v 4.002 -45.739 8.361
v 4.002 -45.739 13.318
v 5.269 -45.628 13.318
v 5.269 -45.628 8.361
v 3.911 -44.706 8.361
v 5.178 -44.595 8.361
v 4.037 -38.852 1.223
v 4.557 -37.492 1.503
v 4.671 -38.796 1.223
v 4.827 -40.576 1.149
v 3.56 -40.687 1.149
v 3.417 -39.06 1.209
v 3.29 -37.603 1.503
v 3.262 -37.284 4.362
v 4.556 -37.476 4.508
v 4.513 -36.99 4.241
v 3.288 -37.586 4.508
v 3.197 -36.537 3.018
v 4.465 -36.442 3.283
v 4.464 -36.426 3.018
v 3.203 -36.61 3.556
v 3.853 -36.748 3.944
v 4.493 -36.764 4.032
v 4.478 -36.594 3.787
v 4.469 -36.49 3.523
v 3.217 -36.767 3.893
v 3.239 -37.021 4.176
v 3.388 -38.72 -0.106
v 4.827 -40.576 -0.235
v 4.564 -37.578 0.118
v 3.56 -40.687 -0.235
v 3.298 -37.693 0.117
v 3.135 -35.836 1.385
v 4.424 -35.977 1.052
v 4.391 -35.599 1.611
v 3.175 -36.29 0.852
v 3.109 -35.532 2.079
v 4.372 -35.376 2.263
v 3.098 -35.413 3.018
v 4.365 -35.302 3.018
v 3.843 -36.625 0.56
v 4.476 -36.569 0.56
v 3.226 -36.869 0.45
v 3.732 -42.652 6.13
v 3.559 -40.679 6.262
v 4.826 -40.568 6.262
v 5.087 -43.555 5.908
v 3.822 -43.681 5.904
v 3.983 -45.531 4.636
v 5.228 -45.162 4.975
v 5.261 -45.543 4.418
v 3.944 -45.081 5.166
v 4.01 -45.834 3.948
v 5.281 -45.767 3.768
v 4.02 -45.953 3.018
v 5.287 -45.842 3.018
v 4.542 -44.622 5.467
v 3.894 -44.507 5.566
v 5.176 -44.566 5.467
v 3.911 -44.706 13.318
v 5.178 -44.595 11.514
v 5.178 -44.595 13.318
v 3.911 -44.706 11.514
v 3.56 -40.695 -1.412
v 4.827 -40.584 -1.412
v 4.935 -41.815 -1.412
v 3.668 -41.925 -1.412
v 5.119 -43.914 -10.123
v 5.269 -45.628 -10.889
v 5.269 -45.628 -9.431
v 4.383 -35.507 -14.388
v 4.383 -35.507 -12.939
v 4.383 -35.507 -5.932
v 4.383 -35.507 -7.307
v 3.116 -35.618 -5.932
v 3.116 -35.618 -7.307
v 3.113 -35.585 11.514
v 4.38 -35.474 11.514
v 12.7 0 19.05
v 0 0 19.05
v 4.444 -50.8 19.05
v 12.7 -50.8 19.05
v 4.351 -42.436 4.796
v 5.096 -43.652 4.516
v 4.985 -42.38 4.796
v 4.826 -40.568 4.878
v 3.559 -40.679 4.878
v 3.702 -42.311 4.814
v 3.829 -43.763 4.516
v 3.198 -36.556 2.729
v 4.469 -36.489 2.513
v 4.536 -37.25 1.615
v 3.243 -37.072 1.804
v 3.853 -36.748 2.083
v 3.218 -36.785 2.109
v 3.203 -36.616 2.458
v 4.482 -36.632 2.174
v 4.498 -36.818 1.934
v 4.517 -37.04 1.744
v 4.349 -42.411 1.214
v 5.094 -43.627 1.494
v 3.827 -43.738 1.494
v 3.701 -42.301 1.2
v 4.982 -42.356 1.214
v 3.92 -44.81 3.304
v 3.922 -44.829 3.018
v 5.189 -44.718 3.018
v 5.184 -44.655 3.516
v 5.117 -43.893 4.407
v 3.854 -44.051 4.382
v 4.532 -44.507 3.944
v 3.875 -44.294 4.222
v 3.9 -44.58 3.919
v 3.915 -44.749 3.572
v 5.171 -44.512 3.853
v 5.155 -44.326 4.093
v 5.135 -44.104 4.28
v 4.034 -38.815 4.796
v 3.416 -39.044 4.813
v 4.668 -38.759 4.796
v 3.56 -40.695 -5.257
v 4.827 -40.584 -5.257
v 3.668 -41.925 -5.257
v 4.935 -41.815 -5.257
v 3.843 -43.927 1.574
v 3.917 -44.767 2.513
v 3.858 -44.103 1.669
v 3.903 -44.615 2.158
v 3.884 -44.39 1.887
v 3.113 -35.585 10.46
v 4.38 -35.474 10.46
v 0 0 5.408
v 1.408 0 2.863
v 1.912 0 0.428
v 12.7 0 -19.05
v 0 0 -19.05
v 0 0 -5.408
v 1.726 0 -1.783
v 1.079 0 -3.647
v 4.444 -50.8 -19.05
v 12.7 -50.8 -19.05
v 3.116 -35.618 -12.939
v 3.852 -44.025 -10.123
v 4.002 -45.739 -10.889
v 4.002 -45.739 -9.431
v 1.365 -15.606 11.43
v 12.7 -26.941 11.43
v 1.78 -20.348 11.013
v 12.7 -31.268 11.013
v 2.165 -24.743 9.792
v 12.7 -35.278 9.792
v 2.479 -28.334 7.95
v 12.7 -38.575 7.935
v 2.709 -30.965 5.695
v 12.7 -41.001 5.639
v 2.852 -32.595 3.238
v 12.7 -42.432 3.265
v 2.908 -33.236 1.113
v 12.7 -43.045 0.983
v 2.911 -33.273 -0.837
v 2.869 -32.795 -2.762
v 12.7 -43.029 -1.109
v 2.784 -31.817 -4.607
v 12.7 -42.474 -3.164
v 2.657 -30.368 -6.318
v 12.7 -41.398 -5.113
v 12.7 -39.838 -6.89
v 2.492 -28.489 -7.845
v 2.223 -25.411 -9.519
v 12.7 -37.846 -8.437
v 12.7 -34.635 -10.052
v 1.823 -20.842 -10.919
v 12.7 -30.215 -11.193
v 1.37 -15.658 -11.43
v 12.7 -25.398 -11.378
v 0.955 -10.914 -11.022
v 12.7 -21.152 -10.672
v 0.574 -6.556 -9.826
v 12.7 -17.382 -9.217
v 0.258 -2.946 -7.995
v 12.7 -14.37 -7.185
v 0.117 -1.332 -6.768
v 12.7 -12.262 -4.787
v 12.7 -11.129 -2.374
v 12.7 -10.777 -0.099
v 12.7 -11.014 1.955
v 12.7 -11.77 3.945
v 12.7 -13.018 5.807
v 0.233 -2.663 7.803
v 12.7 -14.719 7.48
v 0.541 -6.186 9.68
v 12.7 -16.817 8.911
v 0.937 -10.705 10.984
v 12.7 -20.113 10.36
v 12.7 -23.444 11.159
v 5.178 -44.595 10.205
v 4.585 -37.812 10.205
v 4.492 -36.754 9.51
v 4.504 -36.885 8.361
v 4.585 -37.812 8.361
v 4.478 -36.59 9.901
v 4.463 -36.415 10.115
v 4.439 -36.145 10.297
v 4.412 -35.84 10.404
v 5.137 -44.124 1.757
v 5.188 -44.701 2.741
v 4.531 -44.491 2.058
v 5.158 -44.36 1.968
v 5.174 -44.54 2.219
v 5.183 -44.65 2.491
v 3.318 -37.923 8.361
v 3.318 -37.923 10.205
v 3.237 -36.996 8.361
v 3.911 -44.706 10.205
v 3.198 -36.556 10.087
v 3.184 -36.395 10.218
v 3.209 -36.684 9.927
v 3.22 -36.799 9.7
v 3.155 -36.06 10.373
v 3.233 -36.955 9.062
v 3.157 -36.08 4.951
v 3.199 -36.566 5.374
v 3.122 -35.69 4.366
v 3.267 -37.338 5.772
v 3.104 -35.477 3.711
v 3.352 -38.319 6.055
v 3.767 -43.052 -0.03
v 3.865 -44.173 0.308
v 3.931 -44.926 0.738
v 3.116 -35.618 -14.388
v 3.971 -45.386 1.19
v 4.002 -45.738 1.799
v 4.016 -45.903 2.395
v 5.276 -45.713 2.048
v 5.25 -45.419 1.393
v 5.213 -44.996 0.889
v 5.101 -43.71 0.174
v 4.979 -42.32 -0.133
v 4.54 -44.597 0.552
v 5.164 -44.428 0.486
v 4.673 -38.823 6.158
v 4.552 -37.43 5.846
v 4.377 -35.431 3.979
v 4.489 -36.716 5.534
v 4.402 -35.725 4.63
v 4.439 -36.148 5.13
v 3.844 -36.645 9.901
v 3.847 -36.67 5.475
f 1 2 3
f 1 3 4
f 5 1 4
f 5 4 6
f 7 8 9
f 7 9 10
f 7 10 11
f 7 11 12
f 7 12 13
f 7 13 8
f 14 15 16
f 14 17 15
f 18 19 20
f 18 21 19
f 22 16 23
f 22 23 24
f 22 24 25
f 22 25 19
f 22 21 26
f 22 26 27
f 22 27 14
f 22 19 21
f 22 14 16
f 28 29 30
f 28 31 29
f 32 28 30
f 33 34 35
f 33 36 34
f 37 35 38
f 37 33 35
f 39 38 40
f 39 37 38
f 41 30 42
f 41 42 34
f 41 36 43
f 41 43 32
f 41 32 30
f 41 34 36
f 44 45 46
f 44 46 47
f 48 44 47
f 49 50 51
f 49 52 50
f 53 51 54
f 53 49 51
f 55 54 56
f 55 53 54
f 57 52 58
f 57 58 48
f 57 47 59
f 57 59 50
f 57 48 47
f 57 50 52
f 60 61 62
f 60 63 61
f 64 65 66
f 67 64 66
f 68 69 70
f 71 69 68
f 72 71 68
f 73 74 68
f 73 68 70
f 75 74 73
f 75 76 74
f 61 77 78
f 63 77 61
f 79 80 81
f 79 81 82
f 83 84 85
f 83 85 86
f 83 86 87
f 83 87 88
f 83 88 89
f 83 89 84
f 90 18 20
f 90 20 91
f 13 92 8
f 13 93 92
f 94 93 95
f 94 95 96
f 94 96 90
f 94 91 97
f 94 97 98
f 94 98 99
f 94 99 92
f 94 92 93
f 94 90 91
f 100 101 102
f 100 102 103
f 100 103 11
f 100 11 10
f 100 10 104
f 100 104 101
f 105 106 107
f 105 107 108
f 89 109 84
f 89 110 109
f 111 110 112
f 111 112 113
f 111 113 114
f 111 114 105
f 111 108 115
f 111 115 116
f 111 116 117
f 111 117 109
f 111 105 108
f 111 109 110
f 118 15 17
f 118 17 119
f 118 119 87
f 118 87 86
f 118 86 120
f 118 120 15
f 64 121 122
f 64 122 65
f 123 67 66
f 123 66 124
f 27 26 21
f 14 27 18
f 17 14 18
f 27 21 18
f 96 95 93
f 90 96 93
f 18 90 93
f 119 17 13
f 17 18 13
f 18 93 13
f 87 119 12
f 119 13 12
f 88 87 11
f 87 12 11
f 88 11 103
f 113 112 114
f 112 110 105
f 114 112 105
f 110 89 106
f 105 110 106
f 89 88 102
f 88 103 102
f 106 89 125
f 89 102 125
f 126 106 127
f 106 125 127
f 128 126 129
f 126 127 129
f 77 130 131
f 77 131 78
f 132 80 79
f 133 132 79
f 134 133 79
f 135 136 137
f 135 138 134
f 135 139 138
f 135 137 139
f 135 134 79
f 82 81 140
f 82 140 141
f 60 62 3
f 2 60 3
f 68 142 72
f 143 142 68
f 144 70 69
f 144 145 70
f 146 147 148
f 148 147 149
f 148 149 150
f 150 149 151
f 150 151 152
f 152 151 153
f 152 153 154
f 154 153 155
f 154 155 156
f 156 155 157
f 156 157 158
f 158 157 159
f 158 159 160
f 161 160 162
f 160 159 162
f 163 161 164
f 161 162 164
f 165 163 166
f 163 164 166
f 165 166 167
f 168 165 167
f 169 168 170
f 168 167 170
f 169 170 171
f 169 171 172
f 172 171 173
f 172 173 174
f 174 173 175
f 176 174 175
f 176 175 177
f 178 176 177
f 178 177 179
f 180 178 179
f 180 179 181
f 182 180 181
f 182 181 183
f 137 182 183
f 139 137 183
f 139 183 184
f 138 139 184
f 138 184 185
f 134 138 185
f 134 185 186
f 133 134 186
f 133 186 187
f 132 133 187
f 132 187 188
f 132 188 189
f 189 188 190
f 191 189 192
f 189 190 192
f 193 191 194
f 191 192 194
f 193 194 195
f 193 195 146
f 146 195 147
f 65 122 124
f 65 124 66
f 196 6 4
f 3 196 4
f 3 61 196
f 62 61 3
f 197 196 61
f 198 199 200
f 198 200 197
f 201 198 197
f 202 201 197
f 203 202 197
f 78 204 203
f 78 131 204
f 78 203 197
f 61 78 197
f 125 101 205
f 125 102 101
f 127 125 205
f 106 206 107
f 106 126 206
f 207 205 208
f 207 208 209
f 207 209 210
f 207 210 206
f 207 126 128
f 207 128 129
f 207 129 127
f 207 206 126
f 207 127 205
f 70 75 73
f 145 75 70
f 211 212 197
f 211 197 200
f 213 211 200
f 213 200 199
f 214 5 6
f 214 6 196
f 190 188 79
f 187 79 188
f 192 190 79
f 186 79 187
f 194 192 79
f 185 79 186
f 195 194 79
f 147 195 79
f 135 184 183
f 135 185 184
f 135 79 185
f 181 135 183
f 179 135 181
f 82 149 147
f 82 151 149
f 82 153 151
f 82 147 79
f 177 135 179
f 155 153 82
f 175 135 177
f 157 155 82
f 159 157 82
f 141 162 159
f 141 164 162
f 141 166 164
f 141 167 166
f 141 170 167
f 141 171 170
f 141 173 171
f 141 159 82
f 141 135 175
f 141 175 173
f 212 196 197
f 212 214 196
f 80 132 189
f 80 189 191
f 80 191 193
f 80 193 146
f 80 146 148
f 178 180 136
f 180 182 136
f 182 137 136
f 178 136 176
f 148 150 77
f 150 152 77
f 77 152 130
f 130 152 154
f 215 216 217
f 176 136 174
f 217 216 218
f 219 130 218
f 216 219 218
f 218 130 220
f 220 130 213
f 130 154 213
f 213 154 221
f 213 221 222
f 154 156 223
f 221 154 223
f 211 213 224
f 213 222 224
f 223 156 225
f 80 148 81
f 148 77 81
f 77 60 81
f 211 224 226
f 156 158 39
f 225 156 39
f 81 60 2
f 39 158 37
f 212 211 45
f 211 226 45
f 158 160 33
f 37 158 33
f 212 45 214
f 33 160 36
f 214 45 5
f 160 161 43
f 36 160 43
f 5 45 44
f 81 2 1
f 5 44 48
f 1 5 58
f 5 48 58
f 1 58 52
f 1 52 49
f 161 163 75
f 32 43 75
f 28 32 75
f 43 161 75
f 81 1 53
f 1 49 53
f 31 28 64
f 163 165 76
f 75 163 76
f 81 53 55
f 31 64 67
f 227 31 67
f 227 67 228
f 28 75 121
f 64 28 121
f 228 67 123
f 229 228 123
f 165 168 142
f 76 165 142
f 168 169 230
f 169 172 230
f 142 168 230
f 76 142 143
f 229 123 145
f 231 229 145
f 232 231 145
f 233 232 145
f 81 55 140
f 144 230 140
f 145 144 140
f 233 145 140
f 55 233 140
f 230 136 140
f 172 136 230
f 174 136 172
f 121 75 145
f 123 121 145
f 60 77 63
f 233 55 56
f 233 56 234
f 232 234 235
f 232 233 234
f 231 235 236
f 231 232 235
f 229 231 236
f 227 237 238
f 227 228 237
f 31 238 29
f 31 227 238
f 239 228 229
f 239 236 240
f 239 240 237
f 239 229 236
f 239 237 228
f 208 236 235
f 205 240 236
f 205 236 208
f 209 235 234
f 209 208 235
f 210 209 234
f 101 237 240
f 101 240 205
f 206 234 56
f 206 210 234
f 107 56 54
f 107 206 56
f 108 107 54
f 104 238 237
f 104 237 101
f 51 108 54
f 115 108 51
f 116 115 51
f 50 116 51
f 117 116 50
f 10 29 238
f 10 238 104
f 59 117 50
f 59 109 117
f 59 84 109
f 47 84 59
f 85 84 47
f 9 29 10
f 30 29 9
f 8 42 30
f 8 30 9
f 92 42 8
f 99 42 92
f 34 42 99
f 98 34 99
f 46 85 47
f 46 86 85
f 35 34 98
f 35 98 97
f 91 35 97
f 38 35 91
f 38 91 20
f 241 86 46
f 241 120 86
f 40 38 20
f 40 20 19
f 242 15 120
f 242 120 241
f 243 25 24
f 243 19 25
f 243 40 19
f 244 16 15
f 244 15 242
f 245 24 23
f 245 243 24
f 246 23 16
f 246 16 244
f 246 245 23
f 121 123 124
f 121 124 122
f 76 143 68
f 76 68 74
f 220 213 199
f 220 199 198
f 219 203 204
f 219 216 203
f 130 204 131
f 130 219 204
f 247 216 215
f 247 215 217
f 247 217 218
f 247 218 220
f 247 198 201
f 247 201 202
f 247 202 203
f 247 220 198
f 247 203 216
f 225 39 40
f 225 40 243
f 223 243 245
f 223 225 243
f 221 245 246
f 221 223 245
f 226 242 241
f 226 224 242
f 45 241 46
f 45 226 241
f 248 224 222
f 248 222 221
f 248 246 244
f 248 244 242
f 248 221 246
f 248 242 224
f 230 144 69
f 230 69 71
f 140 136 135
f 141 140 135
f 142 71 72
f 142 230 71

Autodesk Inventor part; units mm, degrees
ref_plane "YZ Plane" through (0, 0, 0) normal (1, 0, 0) x (0, 1, 0)
ref_plane "XZ Plane" through (0, 0, 0) normal (0, 1, 0) x (-1, 0, 0)
sketch "Sketch1" plane through (0, 0, 0) normal (0, 0, 1) x (1, 0, 0)
  line L0 (0, 0) -> (4.4444, -50.8)
  line L1 (0, -76.2) -> (0, 12.7) projected
  line L2 (0, 0) -> (12.7, 0)
  line L3 (12.7, 0) -> (12.7, -50.8)
  line L4 (4.4444, -50.8) -> (12.7, -50.8)
  dimension "d0" = 5
  dimension "d1" = 12.7
  dimension "d3" = 50.8
extrude "Extrusion1" add sketch "Sketch1" along normal mid plane 38.1
ref_plane "Work Plane1" through (12.7, -50.8, 0) normal (0.7071, -0.7071, 0) x (0, 0, 1)
sketch "Sketch2" plane through (12.7, -50.8, 0) normal (0.7071, -0.7071, 0) x (0, 0, 1)
  line L0 (19.05, 0) -> (19.05, -35.921) projected
  line L1 (19.05, -35.921) -> (-19.05, -35.921) projected
  line L2 (-19.05, -35.921) -> (-19.05, 0) projected
  line L3 (-19.05, 0) -> (19.05, 0) projected
  circle A0 centre (0, -16.871) radius 11.43
  point P0 (0, -26.9408)
  dimension "d7" = 22.86
  dimension "d10" = 19.05
extrude "Extrusion2" cut sketch "Sketch2" against normal through all contours A0
sketch "Sketch3" plane through (4.4444, -50.8, -19.05) normal (-0.9962, -0.0872, 0) x (0, 0, 1)
  line L0 (0, 0) -> (0, 50.994) construction
  line L1 (0, 10.16) -> (38.1, 10.16) construction
  line L2 (38.1, 50.994) -> (38.1, 0) construction
  line L3 (0, 0) -> (38.1, 0) construction
  line L4 (13.1178, 15.24) -> (9.6187, 5.08)
  line L5 (9.6187, 5.08) -> (8.1613, 5.08)
  line L6 (8.1613, 5.08) -> (4.6622, 15.24)
  line L7 (4.6622, 15.24) -> (6.1112, 15.24)
  line L8 (6.1112, 15.24) -> (8.9271, 6.8008)
  line L9 (8.9271, 6.8008) -> (11.7429, 15.24)
  line L10 (11.7429, 15.24) -> (13.1178, 15.24)
  line L11 (17.638, 8.9085) -> (13.793, 8.9085)
  line L12 (13.793, 8.9085) -> (13.793, 10.1435)
  line L13 (13.793, 10.1435) -> (17.638, 10.1435)
  line L14 (17.638, 10.1435) -> (17.638, 8.9085)
  spline S0 degree 2 poles (25.3115, 10.16) (25.3115, 7.4265) (23.7224, 4.8659) (22.0675, 4.8659) knots 0 0 0 1 2 2 2
  spline S1 degree 2 poles (22.0675, 4.8659) (20.3879, 4.8659) (18.8153, 7.4759) (18.8153, 10.1518) knots 0 0 0 1 2 2 2
  spline S2 degree 2 poles (18.8153, 10.1518) (18.8153, 12.9017) (20.4044, 15.4458) (22.0675, 15.4458) knots 0 0 0 1 2 2 2
  spline S3 degree 2 poles (22.0675, 15.4458) (23.7389, 15.4458) (25.3115, 12.8112) (25.3115, 10.16) knots 0 0 0 1 2 2 2
  spline S4 degree 2 poles (23.566, 7.0642) (23.7636, 7.5665) (23.9283, 9.1144) (23.9283, 10.16) knots 0 0 0 1 2 2 2
  spline S5 degree 2 poles (23.9283, 10.16) (23.9283, 11.2056) (23.7636, 12.7453) (23.5578, 13.264) knots 0 0 0 1 2 2 2
  spline S6 degree 2 poles (23.5578, 13.264) (23.3519, 13.7827) (22.6356, 14.3179) (22.0675, 14.3179) knots 0 0 0 1 2 2 2
  spline S7 degree 2 poles (22.0675, 14.3179) (21.4994, 14.3179) (20.7667, 13.7827) (20.5526, 13.2475) knots 0 0 0 1 2 2 2
  spline S8 degree 2 poles (20.5526, 13.2475) (20.3468, 12.7288) (20.1986, 11.148) (20.1986, 10.1518) knots 0 0 0 1 2 2 2
  spline S9 degree 2 poles (20.1986, 10.1518) (20.1986, 9.0814) (20.3303, 7.6488) (20.5444, 7.0889) knots 0 0 0 1 2 2 2
  spline S10 degree 2 poles (20.5444, 7.0889) (20.742, 6.562) (21.4747, 5.9939) (22.0675, 5.9939) knots 0 0 0 1 2 2 2
  spline S11 degree 2 poles (22.0675, 5.9939) (22.6274, 5.9939) (23.3602, 6.5291) (23.566, 7.0642) knots 0 0 0 1 2 2 2
  line L15 (32.3675, 5.08) -> (27.411, 5.08)
  line L16 (27.411, 5.08) -> (27.411, 6.1174)
  line L17 (27.411, 6.1174) -> (29.2553, 6.1174)
  line L18 (29.2553, 6.1174) -> (29.2553, 12.9264)
  line L19 (29.2553, 12.9264) -> (27.411, 12.9264)
  line L20 (27.411, 12.9264) -> (27.411, 13.8568)
  spline S12 degree 2 poles (27.411, 13.8568) (28.4566, 13.8568) (29.4447, 14.4496) (29.5105, 15.2729) knots 0 0 0 1 2 2 2
  line L21 (29.5105, 15.2729) -> (30.5644, 15.2729)
  line L22 (30.5644, 15.2729) -> (30.5644, 6.1174)
  line L23 (30.5644, 6.1174) -> (32.3675, 6.1174)
  line L24 (32.3675, 6.1174) -> (32.3675, 5.08)
  point P0 (19.05, 50.994)
  dimension "d12" = 10.16
extrude "Extrusion3" cut sketch "Sketch3" against normal blind 1.27
equation "\"d0\" = backAngle"
equation "\"d1\" = topPartDepth"
equation "\"d3\" = partHeight"
equation "\"d4\" = partWidth"
equation "\"d7\" = pipeExteriorDiameter"
equation "\"d10\" = pipeCenter"
equation "\"d13\" = textDepth"
equation "\"topPartDepth\" = 12.7"
equation "\"backAngle\" = 5deg"
equation "\"partHeight\" = 50.8"
equation "\"partWidth\" = 38.1"
equation "\"pipeExteriorDiameter\" = 22.86"
equation "\"pipeCenter\" = 19.05"
equation "\"filletEdge\" = 1.05833"
equation "\"textDepth\" = 1.27"
properties part number "waterHeaterVent-V01"
